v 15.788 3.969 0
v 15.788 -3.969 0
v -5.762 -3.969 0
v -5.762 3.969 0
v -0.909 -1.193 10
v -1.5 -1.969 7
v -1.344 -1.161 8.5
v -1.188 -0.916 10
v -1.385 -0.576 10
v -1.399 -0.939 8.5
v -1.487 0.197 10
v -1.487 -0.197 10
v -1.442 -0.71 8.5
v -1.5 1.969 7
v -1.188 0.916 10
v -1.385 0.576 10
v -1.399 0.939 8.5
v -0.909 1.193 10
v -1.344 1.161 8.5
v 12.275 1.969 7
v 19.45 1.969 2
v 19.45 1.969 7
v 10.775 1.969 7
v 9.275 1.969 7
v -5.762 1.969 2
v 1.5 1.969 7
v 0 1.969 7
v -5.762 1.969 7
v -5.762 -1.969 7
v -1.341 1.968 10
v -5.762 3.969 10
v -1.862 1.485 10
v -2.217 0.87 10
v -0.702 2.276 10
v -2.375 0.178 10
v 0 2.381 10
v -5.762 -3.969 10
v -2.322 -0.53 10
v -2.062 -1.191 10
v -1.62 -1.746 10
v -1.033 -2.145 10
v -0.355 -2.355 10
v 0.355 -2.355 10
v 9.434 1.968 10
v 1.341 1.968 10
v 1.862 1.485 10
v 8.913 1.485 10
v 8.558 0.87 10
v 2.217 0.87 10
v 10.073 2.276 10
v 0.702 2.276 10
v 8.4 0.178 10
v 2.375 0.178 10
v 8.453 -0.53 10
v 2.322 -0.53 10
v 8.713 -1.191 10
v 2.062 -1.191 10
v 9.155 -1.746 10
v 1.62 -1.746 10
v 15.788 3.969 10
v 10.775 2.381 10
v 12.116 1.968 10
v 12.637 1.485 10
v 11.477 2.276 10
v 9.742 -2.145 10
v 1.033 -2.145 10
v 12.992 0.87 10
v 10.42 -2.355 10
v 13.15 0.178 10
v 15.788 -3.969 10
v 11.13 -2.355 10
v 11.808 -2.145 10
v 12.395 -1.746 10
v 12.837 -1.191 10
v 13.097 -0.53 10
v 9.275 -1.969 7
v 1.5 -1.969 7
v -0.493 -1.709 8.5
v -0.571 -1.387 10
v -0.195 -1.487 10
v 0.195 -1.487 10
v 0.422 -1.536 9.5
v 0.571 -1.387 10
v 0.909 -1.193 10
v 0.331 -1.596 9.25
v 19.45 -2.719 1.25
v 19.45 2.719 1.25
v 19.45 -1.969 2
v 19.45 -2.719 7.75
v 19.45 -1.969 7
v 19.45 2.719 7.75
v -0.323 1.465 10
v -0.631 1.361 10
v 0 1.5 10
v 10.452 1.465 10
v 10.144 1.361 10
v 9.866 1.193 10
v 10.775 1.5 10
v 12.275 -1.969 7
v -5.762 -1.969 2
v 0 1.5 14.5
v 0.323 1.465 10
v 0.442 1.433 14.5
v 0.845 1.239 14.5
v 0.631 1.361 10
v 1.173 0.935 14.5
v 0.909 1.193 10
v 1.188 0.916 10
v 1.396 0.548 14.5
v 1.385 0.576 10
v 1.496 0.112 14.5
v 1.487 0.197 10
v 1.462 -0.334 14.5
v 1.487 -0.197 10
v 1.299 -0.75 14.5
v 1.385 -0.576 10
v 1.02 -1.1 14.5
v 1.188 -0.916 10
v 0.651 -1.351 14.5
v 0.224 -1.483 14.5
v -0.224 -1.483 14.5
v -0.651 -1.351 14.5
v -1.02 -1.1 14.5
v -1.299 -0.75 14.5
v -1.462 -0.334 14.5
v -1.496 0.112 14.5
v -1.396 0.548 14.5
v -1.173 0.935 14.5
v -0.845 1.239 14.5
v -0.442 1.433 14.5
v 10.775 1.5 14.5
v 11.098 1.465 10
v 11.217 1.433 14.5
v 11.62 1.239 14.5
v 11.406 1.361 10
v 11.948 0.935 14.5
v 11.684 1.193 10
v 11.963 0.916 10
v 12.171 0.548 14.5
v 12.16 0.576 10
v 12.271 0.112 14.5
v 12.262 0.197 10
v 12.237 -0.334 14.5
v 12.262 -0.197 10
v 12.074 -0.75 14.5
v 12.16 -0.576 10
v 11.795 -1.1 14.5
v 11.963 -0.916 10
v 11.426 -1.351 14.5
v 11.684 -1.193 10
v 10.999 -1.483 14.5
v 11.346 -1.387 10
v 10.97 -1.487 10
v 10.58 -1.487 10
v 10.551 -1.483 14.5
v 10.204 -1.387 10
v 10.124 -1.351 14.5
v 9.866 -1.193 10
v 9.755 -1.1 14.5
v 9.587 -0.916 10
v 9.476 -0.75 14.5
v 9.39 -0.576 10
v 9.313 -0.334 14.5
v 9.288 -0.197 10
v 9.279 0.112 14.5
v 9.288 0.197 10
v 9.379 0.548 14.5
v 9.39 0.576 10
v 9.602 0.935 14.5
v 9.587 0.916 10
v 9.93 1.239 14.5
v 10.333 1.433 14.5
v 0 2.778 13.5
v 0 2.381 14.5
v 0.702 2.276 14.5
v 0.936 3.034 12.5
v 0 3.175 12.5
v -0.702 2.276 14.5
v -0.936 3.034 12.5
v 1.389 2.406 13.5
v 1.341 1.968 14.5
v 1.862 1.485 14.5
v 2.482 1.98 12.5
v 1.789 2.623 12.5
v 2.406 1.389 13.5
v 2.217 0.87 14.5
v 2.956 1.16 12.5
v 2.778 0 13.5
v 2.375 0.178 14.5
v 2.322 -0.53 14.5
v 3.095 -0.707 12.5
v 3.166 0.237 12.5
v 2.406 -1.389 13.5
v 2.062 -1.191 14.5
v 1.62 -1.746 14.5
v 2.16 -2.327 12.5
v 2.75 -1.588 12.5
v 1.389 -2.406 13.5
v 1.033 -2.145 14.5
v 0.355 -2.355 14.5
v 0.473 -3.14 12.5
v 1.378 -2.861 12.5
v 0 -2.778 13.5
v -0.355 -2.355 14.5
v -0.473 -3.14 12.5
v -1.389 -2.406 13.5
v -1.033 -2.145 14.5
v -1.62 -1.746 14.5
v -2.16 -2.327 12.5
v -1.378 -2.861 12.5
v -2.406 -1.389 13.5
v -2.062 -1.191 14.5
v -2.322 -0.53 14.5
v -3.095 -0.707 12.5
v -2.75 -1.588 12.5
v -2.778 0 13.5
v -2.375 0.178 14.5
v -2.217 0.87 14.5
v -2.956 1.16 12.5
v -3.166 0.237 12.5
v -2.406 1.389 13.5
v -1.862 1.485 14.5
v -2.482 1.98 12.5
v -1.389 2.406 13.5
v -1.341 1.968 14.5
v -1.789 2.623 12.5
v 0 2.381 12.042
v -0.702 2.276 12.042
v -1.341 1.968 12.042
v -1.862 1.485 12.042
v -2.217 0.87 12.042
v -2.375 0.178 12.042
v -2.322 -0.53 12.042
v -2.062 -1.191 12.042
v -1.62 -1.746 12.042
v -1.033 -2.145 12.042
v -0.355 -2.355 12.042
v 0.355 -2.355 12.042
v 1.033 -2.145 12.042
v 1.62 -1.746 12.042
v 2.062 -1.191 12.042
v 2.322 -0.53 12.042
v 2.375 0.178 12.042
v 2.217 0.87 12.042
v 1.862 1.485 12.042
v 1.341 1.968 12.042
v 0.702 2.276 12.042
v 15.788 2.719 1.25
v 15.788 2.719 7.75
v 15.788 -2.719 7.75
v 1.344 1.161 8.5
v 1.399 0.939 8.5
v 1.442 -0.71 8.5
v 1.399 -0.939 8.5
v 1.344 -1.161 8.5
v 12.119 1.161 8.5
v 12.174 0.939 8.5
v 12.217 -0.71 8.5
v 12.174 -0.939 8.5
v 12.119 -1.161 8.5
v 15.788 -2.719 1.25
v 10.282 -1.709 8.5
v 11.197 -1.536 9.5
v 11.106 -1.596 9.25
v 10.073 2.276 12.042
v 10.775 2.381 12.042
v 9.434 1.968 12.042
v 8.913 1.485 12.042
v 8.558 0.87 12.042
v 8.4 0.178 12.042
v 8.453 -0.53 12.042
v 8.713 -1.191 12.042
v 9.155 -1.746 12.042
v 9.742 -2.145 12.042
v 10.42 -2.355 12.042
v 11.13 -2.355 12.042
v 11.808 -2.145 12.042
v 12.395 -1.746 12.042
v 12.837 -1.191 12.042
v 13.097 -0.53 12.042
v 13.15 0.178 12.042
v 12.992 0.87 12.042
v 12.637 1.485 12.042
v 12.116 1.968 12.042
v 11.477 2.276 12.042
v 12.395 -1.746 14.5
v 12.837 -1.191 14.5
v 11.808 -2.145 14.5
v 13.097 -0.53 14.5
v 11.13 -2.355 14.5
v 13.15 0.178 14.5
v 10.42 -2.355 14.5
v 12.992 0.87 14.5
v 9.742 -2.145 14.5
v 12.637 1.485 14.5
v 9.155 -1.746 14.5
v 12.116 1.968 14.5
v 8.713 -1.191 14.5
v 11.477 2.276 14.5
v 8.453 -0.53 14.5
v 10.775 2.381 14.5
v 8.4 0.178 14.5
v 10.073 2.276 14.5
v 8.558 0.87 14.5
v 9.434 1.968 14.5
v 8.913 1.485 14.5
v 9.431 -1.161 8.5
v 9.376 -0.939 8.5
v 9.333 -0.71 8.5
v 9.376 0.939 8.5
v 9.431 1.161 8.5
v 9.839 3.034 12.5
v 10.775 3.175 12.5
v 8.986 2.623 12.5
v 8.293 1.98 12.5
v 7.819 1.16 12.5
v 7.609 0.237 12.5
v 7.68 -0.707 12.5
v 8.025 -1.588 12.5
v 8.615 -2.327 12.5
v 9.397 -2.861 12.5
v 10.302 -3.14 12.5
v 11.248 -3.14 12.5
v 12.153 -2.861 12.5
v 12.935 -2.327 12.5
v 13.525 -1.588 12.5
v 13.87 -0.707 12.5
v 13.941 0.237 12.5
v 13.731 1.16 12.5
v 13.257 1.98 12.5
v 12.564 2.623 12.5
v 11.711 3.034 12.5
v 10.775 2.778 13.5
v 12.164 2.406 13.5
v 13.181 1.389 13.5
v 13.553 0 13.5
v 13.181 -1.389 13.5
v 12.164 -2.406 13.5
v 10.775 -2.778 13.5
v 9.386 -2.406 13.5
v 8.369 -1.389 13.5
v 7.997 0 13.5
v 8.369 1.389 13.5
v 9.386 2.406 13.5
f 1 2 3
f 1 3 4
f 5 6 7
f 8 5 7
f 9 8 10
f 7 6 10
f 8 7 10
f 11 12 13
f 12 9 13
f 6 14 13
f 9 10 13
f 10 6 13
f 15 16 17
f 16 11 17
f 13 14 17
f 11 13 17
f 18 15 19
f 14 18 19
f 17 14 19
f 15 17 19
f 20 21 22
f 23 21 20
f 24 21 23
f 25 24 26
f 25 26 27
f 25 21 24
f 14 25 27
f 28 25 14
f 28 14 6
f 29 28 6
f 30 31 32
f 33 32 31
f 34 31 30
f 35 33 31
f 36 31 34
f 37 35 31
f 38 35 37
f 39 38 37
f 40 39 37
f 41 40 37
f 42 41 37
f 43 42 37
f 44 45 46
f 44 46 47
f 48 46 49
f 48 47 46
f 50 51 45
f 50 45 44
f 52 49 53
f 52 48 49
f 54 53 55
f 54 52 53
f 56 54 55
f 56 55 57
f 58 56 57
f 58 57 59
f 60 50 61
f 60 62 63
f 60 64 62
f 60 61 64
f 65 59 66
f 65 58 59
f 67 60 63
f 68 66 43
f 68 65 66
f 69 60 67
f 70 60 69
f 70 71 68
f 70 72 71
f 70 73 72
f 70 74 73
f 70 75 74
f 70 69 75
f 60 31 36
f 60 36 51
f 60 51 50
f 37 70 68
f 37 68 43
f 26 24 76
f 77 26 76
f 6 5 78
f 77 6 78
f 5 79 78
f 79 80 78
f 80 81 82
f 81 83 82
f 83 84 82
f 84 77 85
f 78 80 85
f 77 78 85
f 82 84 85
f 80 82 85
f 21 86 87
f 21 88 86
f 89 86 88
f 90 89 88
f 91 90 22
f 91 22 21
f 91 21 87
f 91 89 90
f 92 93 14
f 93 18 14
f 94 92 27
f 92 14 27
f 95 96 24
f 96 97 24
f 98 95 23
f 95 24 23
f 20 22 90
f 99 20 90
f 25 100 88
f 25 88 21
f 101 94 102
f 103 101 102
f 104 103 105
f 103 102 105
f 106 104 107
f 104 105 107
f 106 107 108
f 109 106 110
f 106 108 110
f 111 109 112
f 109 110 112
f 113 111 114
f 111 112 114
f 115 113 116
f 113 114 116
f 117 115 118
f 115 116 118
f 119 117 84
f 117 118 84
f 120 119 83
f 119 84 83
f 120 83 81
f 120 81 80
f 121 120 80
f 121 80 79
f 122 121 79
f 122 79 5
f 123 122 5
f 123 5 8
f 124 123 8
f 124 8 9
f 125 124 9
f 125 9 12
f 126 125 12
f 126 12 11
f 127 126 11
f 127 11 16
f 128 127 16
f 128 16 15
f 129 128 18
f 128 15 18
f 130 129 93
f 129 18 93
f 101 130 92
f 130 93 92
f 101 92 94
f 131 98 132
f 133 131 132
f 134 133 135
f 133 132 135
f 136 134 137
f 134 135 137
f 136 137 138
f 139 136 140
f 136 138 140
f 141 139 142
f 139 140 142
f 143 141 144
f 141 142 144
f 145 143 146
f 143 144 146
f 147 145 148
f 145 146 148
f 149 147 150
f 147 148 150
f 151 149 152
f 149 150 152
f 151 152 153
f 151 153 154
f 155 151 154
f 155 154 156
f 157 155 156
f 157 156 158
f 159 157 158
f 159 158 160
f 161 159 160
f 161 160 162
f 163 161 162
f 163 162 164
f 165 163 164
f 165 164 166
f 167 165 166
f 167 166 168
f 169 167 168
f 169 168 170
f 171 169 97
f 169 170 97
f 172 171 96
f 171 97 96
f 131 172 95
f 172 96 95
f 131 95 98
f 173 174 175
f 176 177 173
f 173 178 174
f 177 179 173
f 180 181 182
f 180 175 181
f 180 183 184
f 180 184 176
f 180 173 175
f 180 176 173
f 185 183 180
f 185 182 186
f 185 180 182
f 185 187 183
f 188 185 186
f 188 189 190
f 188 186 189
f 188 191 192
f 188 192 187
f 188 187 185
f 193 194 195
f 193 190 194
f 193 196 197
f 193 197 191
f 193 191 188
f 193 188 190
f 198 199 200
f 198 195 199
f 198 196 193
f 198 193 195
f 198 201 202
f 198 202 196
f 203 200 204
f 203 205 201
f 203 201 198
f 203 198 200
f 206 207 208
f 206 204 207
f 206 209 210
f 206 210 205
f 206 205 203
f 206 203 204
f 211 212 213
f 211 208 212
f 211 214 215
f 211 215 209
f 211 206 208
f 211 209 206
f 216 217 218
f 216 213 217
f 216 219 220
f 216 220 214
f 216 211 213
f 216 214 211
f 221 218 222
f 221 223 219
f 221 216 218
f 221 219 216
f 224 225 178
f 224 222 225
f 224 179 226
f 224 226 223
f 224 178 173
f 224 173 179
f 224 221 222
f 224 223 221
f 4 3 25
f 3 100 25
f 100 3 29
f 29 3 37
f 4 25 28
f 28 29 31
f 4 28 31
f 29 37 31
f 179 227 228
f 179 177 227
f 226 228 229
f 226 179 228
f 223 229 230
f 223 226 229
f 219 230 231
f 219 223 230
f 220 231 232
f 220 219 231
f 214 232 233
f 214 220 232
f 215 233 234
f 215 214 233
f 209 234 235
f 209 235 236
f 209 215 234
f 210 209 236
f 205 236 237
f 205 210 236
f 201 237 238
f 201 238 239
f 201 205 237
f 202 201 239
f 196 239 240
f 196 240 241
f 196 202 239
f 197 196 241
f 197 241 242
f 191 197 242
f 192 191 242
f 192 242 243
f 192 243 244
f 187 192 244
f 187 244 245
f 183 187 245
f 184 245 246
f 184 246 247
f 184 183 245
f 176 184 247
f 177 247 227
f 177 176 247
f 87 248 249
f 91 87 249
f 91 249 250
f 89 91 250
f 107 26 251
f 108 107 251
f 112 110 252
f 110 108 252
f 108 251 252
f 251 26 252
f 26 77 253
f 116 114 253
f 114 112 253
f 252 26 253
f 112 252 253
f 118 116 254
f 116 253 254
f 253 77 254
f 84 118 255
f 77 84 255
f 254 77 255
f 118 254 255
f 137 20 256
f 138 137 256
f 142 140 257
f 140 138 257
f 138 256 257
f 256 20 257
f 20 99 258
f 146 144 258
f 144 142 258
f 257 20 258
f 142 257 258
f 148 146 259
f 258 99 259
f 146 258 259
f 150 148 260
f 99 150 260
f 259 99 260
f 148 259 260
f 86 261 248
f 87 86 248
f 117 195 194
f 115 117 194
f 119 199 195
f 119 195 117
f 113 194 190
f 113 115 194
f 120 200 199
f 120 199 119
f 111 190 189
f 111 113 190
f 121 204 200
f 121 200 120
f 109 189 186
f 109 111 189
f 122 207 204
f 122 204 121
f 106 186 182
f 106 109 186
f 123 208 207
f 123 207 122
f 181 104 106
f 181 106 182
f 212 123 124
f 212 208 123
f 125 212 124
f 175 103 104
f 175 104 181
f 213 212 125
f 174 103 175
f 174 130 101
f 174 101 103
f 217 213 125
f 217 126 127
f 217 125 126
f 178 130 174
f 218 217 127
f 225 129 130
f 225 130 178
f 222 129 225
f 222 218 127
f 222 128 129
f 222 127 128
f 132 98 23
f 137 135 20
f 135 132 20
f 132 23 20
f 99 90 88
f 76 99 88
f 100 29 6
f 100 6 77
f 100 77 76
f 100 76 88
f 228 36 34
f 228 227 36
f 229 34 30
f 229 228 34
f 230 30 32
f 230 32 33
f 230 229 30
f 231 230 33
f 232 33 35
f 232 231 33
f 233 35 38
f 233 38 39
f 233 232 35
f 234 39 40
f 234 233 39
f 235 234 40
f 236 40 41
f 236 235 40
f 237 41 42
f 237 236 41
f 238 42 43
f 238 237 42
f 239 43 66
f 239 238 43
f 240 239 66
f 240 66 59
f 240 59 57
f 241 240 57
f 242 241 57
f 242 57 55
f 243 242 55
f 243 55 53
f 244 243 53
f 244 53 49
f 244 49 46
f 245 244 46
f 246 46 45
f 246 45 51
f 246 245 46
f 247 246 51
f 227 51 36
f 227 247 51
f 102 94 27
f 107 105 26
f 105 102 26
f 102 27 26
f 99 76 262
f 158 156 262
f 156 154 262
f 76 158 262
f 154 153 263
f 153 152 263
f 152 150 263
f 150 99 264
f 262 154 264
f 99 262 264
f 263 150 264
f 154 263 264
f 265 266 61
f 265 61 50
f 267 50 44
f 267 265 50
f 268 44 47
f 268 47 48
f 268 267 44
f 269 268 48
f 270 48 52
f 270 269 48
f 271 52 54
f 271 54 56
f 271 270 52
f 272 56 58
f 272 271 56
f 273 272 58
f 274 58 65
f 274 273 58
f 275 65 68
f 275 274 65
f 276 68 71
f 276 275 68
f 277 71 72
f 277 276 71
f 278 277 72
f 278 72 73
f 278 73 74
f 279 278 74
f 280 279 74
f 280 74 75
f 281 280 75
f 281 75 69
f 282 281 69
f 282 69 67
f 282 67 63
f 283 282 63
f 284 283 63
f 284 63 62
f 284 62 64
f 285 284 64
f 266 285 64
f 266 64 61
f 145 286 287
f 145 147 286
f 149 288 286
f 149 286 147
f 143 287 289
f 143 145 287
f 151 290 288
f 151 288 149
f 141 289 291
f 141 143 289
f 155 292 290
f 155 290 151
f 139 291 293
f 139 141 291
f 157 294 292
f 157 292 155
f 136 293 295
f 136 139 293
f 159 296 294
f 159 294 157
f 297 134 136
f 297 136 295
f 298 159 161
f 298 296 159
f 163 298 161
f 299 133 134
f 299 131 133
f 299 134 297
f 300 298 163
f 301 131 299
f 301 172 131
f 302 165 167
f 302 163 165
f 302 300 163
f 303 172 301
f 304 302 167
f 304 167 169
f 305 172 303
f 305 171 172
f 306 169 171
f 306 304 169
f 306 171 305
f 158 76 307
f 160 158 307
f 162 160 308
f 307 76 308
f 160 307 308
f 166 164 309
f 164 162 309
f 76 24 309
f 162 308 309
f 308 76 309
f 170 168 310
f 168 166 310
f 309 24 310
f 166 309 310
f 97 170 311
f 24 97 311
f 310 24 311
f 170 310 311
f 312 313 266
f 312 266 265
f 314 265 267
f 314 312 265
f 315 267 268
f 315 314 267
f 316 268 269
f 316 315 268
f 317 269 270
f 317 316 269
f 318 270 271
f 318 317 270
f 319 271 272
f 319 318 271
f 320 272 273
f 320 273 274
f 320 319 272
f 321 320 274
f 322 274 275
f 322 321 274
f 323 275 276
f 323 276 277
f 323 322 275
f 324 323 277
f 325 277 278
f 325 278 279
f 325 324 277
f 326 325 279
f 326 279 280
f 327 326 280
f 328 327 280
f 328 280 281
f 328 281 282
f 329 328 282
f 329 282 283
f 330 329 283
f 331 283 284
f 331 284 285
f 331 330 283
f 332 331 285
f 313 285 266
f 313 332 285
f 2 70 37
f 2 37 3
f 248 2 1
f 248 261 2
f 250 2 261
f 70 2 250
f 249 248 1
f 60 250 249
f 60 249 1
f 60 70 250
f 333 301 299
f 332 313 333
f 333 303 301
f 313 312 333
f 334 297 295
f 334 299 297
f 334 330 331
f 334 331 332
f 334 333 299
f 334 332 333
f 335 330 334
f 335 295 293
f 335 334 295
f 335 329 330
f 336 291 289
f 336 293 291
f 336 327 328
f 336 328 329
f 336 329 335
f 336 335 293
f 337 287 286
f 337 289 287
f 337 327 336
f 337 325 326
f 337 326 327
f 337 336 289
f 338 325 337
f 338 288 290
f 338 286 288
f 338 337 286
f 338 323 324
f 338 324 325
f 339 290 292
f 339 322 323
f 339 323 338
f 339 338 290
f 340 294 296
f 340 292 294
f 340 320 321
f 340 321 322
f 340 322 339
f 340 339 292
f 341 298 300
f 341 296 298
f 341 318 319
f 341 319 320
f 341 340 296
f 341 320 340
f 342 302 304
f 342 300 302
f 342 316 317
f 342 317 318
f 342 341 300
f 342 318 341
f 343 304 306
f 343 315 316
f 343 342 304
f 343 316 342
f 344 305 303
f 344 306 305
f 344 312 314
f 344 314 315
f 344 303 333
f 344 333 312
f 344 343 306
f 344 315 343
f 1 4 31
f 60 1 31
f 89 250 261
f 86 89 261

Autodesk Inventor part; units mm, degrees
ref_plane "Start Plane" through (-5.7625, 0, 0) normal (1, 0, 0) x (0, 1, 0)
ref_plane "End Plane" through (15.7875, 0, 0) normal (1, 0, 0) x (0, 1, 0)
sketch "Box Sketch" plane through (0, 0, 0) normal (1, 0, 0) x (0, 1, 0)
  line L0 (-3.9688, 0) -> (3.9688, 0)
  line L1 (3.9688, 0) -> (3.9688, 10)
  line L2 (3.9688, 10) -> (-3.9688, 10)
  line L3 (-3.9688, 10) -> (-3.9688, 0)
  line L4 (-1.9688, 2) -> (1.9688, 2)
  line L5 (1.9688, 2) -> (1.9687, 7)
  line L6 (1.9687, 7) -> (-1.9687, 7)
  line L7 (-1.9687, 7) -> (-1.9688, 2)
  line L8 (1.9688, 2) -> (3.9688, 2) construction
  line L9 (-1.9688, 2) -> (-3.9688, 2) construction
  line L10 (-1.9688, 2) -> (-1.9688, 0) construction
  line L11 (2.7188, 1.25) -> (2.7188, 7.75)
  line L12 (2.7188, 7.75) -> (-2.7188, 7.75)
  line L13 (-2.7188, 7.75) -> (-2.7188, 1.25)
  line L14 (-2.7188, 1.25) -> (2.7188, 1.25)
  line L15 (-1.9687, 7) -> (-2.7188, 7) construction
  line L16 (1.9687, 7) -> (2.7188, 7) construction
  line L17 (1.9688, 2) -> (1.9687, 1.25) construction
  line L18 (-1.9687, 7) -> (-1.9687, 7.75) construction
  line L19 (-2.8688, 7.9) -> (2.8688, 7.9)
  line L20 (2.8688, 7.9) -> (2.8688, 1.1)
  line L21 (2.8688, 1.1) -> (-2.8688, 1.1)
  line L22 (-2.8688, 1.1) -> (-2.8688, 7.9)
  point P0 (0, 0)
  point P1 (0, 0)
  dimension "boxHeight" = 7.9375
  dimension "boxWidth" = 10
  dimension "frontWallThick" = 3
  dimension "sideWallThick" = 2
  dimension "connectorTol" = 0.15
  dimension "d24" = 0.75
sketch "Fitting Sketch" plane through (0, 0, 0) normal (1, 0, 0) x (0, 1, 0)
  line L0 (0, 10) -> (0, 14.5) construction
  line L1 (2.3813, 10) -> (2.3813, 12.0417)
  line L2 (2.3813, 12.0417) -> (3.175, 12.5)
  line L3 (3.175, 12.5) -> (2.3813, 14.5)
  line L4 (2.3813, 14.5) -> (1.5, 14.5)
  line L5 (1.5, 14.5) -> (1.5, 10)
  line L6 (1.5, 10) -> (2.3813, 10)
  point P0 (0, 0)
  dimension "d2" = 3
  dimension "d3" = 2
  dimension "d4" = 60
  dimension "d5" = 2.5
  dimension "d6" = 4.7625
  dimension "d7" = 6.35
  dimension "d9" = 10
revolve "Fitting" add sketch "Fitting Sketch" angle 360 about axis through (0, 0, 10) along (0, 0, 1)
extrude "Box" add sketch "Box Sketch" along normal mid plane 11.525 contours L3 L2 L1 L0 | L14 L13 L12 L11 | L19 L20 L21 L22
ref_plane "Loft Start Plane" through (0, 0, 7) normal (0, 0, 1) x (1, 0, 0)
sketch "Loft Sketch" plane through (0, 0, 7) normal (0, 0, 1) x (1, 0, 0)
  line L0 (1.5, -1.9688) -> (-1.5, -1.9688)
  line L1 (-1.5, -1.9688) -> (-1.5, 1.9687)
  line L2 (-1.5, 1.9687) -> (1.5, 1.9687)
  line L3 (1.5, 1.9687) -> (1.5, -1.9688)
  line L4 (1.5, -1.9688) -> (-1.5, 1.9687) construction
  line L5 (-1.5, -1.9688) -> (1.5, 1.9687) construction
  point P0 (0, 0)
  dimension "d17" = 3
  dimension "d18" = 3.9375
loft "Loft" cut profiles "Loft Sketch" section 1 edges at (0, -1.5, 10)
pattern_linear "Channel Repetition" count 2 spacing 10.775 along (1, 0, 0)
extrude "Clip Extra Length" cut sketch "Box Sketch" along normal blind 19.45 from surface at 15.7875 contours L3 L2 L1 L0 | L19 L20 L21 L22
extrude "Connector" add sketch "Box Sketch" along normal blind 3.6625 from surface at 15.7875 contours L14 L13 L12 L11
equation "\"boxHeight\" = fittingBarbOD + 2 * siliconeThick"
equation "\"boxWidth\" = manifoldWidth"
equation "\"d2\" = fittingID"
equation "\"d3\" = fittingBarbLength"
equation "\"d4\" = fittingBarbBaseAngle"
equation "\"d5\" = fittingNeckLength"
equation "\"d6\" = fittingOD"
equation "\"d7\" = fittingBarbOD"
equation "\"d9\" = boxWidth"
equation "\"d14\" = blockWidth"
equation "\"d27\" = chanWidth"
equation "\"d17\" = fittingID"
equation "\"d18\" = boxHeight - 2 * sideWallThick"
equation "\"d16\" = boxWidth - frontWallThick"
equation "\"d29\" = -0.5 * blockWidth"
equation "\"fittingBarbOD\" = 6.35"
equation "\"siliconeThick\" = 0.79375"
equation "\"manifoldWidth\" = 10"
equation "\"fittingID\" = 3"
equation "\"fittingBarbLength\" = 2"
equation "\"fittingBarbBaseAngle\" = 60deg"
equation "\"fittingNeckLength\" = 2.5"
equation "\"fittingOD\" = 4.7625"
equation "\"blockWidth\" = 11.525"
equation "\"chanWidth\" = 10.775"
properties part number "manifold_lower" material "PLA (Blue-glowing, 3D Printed)"
